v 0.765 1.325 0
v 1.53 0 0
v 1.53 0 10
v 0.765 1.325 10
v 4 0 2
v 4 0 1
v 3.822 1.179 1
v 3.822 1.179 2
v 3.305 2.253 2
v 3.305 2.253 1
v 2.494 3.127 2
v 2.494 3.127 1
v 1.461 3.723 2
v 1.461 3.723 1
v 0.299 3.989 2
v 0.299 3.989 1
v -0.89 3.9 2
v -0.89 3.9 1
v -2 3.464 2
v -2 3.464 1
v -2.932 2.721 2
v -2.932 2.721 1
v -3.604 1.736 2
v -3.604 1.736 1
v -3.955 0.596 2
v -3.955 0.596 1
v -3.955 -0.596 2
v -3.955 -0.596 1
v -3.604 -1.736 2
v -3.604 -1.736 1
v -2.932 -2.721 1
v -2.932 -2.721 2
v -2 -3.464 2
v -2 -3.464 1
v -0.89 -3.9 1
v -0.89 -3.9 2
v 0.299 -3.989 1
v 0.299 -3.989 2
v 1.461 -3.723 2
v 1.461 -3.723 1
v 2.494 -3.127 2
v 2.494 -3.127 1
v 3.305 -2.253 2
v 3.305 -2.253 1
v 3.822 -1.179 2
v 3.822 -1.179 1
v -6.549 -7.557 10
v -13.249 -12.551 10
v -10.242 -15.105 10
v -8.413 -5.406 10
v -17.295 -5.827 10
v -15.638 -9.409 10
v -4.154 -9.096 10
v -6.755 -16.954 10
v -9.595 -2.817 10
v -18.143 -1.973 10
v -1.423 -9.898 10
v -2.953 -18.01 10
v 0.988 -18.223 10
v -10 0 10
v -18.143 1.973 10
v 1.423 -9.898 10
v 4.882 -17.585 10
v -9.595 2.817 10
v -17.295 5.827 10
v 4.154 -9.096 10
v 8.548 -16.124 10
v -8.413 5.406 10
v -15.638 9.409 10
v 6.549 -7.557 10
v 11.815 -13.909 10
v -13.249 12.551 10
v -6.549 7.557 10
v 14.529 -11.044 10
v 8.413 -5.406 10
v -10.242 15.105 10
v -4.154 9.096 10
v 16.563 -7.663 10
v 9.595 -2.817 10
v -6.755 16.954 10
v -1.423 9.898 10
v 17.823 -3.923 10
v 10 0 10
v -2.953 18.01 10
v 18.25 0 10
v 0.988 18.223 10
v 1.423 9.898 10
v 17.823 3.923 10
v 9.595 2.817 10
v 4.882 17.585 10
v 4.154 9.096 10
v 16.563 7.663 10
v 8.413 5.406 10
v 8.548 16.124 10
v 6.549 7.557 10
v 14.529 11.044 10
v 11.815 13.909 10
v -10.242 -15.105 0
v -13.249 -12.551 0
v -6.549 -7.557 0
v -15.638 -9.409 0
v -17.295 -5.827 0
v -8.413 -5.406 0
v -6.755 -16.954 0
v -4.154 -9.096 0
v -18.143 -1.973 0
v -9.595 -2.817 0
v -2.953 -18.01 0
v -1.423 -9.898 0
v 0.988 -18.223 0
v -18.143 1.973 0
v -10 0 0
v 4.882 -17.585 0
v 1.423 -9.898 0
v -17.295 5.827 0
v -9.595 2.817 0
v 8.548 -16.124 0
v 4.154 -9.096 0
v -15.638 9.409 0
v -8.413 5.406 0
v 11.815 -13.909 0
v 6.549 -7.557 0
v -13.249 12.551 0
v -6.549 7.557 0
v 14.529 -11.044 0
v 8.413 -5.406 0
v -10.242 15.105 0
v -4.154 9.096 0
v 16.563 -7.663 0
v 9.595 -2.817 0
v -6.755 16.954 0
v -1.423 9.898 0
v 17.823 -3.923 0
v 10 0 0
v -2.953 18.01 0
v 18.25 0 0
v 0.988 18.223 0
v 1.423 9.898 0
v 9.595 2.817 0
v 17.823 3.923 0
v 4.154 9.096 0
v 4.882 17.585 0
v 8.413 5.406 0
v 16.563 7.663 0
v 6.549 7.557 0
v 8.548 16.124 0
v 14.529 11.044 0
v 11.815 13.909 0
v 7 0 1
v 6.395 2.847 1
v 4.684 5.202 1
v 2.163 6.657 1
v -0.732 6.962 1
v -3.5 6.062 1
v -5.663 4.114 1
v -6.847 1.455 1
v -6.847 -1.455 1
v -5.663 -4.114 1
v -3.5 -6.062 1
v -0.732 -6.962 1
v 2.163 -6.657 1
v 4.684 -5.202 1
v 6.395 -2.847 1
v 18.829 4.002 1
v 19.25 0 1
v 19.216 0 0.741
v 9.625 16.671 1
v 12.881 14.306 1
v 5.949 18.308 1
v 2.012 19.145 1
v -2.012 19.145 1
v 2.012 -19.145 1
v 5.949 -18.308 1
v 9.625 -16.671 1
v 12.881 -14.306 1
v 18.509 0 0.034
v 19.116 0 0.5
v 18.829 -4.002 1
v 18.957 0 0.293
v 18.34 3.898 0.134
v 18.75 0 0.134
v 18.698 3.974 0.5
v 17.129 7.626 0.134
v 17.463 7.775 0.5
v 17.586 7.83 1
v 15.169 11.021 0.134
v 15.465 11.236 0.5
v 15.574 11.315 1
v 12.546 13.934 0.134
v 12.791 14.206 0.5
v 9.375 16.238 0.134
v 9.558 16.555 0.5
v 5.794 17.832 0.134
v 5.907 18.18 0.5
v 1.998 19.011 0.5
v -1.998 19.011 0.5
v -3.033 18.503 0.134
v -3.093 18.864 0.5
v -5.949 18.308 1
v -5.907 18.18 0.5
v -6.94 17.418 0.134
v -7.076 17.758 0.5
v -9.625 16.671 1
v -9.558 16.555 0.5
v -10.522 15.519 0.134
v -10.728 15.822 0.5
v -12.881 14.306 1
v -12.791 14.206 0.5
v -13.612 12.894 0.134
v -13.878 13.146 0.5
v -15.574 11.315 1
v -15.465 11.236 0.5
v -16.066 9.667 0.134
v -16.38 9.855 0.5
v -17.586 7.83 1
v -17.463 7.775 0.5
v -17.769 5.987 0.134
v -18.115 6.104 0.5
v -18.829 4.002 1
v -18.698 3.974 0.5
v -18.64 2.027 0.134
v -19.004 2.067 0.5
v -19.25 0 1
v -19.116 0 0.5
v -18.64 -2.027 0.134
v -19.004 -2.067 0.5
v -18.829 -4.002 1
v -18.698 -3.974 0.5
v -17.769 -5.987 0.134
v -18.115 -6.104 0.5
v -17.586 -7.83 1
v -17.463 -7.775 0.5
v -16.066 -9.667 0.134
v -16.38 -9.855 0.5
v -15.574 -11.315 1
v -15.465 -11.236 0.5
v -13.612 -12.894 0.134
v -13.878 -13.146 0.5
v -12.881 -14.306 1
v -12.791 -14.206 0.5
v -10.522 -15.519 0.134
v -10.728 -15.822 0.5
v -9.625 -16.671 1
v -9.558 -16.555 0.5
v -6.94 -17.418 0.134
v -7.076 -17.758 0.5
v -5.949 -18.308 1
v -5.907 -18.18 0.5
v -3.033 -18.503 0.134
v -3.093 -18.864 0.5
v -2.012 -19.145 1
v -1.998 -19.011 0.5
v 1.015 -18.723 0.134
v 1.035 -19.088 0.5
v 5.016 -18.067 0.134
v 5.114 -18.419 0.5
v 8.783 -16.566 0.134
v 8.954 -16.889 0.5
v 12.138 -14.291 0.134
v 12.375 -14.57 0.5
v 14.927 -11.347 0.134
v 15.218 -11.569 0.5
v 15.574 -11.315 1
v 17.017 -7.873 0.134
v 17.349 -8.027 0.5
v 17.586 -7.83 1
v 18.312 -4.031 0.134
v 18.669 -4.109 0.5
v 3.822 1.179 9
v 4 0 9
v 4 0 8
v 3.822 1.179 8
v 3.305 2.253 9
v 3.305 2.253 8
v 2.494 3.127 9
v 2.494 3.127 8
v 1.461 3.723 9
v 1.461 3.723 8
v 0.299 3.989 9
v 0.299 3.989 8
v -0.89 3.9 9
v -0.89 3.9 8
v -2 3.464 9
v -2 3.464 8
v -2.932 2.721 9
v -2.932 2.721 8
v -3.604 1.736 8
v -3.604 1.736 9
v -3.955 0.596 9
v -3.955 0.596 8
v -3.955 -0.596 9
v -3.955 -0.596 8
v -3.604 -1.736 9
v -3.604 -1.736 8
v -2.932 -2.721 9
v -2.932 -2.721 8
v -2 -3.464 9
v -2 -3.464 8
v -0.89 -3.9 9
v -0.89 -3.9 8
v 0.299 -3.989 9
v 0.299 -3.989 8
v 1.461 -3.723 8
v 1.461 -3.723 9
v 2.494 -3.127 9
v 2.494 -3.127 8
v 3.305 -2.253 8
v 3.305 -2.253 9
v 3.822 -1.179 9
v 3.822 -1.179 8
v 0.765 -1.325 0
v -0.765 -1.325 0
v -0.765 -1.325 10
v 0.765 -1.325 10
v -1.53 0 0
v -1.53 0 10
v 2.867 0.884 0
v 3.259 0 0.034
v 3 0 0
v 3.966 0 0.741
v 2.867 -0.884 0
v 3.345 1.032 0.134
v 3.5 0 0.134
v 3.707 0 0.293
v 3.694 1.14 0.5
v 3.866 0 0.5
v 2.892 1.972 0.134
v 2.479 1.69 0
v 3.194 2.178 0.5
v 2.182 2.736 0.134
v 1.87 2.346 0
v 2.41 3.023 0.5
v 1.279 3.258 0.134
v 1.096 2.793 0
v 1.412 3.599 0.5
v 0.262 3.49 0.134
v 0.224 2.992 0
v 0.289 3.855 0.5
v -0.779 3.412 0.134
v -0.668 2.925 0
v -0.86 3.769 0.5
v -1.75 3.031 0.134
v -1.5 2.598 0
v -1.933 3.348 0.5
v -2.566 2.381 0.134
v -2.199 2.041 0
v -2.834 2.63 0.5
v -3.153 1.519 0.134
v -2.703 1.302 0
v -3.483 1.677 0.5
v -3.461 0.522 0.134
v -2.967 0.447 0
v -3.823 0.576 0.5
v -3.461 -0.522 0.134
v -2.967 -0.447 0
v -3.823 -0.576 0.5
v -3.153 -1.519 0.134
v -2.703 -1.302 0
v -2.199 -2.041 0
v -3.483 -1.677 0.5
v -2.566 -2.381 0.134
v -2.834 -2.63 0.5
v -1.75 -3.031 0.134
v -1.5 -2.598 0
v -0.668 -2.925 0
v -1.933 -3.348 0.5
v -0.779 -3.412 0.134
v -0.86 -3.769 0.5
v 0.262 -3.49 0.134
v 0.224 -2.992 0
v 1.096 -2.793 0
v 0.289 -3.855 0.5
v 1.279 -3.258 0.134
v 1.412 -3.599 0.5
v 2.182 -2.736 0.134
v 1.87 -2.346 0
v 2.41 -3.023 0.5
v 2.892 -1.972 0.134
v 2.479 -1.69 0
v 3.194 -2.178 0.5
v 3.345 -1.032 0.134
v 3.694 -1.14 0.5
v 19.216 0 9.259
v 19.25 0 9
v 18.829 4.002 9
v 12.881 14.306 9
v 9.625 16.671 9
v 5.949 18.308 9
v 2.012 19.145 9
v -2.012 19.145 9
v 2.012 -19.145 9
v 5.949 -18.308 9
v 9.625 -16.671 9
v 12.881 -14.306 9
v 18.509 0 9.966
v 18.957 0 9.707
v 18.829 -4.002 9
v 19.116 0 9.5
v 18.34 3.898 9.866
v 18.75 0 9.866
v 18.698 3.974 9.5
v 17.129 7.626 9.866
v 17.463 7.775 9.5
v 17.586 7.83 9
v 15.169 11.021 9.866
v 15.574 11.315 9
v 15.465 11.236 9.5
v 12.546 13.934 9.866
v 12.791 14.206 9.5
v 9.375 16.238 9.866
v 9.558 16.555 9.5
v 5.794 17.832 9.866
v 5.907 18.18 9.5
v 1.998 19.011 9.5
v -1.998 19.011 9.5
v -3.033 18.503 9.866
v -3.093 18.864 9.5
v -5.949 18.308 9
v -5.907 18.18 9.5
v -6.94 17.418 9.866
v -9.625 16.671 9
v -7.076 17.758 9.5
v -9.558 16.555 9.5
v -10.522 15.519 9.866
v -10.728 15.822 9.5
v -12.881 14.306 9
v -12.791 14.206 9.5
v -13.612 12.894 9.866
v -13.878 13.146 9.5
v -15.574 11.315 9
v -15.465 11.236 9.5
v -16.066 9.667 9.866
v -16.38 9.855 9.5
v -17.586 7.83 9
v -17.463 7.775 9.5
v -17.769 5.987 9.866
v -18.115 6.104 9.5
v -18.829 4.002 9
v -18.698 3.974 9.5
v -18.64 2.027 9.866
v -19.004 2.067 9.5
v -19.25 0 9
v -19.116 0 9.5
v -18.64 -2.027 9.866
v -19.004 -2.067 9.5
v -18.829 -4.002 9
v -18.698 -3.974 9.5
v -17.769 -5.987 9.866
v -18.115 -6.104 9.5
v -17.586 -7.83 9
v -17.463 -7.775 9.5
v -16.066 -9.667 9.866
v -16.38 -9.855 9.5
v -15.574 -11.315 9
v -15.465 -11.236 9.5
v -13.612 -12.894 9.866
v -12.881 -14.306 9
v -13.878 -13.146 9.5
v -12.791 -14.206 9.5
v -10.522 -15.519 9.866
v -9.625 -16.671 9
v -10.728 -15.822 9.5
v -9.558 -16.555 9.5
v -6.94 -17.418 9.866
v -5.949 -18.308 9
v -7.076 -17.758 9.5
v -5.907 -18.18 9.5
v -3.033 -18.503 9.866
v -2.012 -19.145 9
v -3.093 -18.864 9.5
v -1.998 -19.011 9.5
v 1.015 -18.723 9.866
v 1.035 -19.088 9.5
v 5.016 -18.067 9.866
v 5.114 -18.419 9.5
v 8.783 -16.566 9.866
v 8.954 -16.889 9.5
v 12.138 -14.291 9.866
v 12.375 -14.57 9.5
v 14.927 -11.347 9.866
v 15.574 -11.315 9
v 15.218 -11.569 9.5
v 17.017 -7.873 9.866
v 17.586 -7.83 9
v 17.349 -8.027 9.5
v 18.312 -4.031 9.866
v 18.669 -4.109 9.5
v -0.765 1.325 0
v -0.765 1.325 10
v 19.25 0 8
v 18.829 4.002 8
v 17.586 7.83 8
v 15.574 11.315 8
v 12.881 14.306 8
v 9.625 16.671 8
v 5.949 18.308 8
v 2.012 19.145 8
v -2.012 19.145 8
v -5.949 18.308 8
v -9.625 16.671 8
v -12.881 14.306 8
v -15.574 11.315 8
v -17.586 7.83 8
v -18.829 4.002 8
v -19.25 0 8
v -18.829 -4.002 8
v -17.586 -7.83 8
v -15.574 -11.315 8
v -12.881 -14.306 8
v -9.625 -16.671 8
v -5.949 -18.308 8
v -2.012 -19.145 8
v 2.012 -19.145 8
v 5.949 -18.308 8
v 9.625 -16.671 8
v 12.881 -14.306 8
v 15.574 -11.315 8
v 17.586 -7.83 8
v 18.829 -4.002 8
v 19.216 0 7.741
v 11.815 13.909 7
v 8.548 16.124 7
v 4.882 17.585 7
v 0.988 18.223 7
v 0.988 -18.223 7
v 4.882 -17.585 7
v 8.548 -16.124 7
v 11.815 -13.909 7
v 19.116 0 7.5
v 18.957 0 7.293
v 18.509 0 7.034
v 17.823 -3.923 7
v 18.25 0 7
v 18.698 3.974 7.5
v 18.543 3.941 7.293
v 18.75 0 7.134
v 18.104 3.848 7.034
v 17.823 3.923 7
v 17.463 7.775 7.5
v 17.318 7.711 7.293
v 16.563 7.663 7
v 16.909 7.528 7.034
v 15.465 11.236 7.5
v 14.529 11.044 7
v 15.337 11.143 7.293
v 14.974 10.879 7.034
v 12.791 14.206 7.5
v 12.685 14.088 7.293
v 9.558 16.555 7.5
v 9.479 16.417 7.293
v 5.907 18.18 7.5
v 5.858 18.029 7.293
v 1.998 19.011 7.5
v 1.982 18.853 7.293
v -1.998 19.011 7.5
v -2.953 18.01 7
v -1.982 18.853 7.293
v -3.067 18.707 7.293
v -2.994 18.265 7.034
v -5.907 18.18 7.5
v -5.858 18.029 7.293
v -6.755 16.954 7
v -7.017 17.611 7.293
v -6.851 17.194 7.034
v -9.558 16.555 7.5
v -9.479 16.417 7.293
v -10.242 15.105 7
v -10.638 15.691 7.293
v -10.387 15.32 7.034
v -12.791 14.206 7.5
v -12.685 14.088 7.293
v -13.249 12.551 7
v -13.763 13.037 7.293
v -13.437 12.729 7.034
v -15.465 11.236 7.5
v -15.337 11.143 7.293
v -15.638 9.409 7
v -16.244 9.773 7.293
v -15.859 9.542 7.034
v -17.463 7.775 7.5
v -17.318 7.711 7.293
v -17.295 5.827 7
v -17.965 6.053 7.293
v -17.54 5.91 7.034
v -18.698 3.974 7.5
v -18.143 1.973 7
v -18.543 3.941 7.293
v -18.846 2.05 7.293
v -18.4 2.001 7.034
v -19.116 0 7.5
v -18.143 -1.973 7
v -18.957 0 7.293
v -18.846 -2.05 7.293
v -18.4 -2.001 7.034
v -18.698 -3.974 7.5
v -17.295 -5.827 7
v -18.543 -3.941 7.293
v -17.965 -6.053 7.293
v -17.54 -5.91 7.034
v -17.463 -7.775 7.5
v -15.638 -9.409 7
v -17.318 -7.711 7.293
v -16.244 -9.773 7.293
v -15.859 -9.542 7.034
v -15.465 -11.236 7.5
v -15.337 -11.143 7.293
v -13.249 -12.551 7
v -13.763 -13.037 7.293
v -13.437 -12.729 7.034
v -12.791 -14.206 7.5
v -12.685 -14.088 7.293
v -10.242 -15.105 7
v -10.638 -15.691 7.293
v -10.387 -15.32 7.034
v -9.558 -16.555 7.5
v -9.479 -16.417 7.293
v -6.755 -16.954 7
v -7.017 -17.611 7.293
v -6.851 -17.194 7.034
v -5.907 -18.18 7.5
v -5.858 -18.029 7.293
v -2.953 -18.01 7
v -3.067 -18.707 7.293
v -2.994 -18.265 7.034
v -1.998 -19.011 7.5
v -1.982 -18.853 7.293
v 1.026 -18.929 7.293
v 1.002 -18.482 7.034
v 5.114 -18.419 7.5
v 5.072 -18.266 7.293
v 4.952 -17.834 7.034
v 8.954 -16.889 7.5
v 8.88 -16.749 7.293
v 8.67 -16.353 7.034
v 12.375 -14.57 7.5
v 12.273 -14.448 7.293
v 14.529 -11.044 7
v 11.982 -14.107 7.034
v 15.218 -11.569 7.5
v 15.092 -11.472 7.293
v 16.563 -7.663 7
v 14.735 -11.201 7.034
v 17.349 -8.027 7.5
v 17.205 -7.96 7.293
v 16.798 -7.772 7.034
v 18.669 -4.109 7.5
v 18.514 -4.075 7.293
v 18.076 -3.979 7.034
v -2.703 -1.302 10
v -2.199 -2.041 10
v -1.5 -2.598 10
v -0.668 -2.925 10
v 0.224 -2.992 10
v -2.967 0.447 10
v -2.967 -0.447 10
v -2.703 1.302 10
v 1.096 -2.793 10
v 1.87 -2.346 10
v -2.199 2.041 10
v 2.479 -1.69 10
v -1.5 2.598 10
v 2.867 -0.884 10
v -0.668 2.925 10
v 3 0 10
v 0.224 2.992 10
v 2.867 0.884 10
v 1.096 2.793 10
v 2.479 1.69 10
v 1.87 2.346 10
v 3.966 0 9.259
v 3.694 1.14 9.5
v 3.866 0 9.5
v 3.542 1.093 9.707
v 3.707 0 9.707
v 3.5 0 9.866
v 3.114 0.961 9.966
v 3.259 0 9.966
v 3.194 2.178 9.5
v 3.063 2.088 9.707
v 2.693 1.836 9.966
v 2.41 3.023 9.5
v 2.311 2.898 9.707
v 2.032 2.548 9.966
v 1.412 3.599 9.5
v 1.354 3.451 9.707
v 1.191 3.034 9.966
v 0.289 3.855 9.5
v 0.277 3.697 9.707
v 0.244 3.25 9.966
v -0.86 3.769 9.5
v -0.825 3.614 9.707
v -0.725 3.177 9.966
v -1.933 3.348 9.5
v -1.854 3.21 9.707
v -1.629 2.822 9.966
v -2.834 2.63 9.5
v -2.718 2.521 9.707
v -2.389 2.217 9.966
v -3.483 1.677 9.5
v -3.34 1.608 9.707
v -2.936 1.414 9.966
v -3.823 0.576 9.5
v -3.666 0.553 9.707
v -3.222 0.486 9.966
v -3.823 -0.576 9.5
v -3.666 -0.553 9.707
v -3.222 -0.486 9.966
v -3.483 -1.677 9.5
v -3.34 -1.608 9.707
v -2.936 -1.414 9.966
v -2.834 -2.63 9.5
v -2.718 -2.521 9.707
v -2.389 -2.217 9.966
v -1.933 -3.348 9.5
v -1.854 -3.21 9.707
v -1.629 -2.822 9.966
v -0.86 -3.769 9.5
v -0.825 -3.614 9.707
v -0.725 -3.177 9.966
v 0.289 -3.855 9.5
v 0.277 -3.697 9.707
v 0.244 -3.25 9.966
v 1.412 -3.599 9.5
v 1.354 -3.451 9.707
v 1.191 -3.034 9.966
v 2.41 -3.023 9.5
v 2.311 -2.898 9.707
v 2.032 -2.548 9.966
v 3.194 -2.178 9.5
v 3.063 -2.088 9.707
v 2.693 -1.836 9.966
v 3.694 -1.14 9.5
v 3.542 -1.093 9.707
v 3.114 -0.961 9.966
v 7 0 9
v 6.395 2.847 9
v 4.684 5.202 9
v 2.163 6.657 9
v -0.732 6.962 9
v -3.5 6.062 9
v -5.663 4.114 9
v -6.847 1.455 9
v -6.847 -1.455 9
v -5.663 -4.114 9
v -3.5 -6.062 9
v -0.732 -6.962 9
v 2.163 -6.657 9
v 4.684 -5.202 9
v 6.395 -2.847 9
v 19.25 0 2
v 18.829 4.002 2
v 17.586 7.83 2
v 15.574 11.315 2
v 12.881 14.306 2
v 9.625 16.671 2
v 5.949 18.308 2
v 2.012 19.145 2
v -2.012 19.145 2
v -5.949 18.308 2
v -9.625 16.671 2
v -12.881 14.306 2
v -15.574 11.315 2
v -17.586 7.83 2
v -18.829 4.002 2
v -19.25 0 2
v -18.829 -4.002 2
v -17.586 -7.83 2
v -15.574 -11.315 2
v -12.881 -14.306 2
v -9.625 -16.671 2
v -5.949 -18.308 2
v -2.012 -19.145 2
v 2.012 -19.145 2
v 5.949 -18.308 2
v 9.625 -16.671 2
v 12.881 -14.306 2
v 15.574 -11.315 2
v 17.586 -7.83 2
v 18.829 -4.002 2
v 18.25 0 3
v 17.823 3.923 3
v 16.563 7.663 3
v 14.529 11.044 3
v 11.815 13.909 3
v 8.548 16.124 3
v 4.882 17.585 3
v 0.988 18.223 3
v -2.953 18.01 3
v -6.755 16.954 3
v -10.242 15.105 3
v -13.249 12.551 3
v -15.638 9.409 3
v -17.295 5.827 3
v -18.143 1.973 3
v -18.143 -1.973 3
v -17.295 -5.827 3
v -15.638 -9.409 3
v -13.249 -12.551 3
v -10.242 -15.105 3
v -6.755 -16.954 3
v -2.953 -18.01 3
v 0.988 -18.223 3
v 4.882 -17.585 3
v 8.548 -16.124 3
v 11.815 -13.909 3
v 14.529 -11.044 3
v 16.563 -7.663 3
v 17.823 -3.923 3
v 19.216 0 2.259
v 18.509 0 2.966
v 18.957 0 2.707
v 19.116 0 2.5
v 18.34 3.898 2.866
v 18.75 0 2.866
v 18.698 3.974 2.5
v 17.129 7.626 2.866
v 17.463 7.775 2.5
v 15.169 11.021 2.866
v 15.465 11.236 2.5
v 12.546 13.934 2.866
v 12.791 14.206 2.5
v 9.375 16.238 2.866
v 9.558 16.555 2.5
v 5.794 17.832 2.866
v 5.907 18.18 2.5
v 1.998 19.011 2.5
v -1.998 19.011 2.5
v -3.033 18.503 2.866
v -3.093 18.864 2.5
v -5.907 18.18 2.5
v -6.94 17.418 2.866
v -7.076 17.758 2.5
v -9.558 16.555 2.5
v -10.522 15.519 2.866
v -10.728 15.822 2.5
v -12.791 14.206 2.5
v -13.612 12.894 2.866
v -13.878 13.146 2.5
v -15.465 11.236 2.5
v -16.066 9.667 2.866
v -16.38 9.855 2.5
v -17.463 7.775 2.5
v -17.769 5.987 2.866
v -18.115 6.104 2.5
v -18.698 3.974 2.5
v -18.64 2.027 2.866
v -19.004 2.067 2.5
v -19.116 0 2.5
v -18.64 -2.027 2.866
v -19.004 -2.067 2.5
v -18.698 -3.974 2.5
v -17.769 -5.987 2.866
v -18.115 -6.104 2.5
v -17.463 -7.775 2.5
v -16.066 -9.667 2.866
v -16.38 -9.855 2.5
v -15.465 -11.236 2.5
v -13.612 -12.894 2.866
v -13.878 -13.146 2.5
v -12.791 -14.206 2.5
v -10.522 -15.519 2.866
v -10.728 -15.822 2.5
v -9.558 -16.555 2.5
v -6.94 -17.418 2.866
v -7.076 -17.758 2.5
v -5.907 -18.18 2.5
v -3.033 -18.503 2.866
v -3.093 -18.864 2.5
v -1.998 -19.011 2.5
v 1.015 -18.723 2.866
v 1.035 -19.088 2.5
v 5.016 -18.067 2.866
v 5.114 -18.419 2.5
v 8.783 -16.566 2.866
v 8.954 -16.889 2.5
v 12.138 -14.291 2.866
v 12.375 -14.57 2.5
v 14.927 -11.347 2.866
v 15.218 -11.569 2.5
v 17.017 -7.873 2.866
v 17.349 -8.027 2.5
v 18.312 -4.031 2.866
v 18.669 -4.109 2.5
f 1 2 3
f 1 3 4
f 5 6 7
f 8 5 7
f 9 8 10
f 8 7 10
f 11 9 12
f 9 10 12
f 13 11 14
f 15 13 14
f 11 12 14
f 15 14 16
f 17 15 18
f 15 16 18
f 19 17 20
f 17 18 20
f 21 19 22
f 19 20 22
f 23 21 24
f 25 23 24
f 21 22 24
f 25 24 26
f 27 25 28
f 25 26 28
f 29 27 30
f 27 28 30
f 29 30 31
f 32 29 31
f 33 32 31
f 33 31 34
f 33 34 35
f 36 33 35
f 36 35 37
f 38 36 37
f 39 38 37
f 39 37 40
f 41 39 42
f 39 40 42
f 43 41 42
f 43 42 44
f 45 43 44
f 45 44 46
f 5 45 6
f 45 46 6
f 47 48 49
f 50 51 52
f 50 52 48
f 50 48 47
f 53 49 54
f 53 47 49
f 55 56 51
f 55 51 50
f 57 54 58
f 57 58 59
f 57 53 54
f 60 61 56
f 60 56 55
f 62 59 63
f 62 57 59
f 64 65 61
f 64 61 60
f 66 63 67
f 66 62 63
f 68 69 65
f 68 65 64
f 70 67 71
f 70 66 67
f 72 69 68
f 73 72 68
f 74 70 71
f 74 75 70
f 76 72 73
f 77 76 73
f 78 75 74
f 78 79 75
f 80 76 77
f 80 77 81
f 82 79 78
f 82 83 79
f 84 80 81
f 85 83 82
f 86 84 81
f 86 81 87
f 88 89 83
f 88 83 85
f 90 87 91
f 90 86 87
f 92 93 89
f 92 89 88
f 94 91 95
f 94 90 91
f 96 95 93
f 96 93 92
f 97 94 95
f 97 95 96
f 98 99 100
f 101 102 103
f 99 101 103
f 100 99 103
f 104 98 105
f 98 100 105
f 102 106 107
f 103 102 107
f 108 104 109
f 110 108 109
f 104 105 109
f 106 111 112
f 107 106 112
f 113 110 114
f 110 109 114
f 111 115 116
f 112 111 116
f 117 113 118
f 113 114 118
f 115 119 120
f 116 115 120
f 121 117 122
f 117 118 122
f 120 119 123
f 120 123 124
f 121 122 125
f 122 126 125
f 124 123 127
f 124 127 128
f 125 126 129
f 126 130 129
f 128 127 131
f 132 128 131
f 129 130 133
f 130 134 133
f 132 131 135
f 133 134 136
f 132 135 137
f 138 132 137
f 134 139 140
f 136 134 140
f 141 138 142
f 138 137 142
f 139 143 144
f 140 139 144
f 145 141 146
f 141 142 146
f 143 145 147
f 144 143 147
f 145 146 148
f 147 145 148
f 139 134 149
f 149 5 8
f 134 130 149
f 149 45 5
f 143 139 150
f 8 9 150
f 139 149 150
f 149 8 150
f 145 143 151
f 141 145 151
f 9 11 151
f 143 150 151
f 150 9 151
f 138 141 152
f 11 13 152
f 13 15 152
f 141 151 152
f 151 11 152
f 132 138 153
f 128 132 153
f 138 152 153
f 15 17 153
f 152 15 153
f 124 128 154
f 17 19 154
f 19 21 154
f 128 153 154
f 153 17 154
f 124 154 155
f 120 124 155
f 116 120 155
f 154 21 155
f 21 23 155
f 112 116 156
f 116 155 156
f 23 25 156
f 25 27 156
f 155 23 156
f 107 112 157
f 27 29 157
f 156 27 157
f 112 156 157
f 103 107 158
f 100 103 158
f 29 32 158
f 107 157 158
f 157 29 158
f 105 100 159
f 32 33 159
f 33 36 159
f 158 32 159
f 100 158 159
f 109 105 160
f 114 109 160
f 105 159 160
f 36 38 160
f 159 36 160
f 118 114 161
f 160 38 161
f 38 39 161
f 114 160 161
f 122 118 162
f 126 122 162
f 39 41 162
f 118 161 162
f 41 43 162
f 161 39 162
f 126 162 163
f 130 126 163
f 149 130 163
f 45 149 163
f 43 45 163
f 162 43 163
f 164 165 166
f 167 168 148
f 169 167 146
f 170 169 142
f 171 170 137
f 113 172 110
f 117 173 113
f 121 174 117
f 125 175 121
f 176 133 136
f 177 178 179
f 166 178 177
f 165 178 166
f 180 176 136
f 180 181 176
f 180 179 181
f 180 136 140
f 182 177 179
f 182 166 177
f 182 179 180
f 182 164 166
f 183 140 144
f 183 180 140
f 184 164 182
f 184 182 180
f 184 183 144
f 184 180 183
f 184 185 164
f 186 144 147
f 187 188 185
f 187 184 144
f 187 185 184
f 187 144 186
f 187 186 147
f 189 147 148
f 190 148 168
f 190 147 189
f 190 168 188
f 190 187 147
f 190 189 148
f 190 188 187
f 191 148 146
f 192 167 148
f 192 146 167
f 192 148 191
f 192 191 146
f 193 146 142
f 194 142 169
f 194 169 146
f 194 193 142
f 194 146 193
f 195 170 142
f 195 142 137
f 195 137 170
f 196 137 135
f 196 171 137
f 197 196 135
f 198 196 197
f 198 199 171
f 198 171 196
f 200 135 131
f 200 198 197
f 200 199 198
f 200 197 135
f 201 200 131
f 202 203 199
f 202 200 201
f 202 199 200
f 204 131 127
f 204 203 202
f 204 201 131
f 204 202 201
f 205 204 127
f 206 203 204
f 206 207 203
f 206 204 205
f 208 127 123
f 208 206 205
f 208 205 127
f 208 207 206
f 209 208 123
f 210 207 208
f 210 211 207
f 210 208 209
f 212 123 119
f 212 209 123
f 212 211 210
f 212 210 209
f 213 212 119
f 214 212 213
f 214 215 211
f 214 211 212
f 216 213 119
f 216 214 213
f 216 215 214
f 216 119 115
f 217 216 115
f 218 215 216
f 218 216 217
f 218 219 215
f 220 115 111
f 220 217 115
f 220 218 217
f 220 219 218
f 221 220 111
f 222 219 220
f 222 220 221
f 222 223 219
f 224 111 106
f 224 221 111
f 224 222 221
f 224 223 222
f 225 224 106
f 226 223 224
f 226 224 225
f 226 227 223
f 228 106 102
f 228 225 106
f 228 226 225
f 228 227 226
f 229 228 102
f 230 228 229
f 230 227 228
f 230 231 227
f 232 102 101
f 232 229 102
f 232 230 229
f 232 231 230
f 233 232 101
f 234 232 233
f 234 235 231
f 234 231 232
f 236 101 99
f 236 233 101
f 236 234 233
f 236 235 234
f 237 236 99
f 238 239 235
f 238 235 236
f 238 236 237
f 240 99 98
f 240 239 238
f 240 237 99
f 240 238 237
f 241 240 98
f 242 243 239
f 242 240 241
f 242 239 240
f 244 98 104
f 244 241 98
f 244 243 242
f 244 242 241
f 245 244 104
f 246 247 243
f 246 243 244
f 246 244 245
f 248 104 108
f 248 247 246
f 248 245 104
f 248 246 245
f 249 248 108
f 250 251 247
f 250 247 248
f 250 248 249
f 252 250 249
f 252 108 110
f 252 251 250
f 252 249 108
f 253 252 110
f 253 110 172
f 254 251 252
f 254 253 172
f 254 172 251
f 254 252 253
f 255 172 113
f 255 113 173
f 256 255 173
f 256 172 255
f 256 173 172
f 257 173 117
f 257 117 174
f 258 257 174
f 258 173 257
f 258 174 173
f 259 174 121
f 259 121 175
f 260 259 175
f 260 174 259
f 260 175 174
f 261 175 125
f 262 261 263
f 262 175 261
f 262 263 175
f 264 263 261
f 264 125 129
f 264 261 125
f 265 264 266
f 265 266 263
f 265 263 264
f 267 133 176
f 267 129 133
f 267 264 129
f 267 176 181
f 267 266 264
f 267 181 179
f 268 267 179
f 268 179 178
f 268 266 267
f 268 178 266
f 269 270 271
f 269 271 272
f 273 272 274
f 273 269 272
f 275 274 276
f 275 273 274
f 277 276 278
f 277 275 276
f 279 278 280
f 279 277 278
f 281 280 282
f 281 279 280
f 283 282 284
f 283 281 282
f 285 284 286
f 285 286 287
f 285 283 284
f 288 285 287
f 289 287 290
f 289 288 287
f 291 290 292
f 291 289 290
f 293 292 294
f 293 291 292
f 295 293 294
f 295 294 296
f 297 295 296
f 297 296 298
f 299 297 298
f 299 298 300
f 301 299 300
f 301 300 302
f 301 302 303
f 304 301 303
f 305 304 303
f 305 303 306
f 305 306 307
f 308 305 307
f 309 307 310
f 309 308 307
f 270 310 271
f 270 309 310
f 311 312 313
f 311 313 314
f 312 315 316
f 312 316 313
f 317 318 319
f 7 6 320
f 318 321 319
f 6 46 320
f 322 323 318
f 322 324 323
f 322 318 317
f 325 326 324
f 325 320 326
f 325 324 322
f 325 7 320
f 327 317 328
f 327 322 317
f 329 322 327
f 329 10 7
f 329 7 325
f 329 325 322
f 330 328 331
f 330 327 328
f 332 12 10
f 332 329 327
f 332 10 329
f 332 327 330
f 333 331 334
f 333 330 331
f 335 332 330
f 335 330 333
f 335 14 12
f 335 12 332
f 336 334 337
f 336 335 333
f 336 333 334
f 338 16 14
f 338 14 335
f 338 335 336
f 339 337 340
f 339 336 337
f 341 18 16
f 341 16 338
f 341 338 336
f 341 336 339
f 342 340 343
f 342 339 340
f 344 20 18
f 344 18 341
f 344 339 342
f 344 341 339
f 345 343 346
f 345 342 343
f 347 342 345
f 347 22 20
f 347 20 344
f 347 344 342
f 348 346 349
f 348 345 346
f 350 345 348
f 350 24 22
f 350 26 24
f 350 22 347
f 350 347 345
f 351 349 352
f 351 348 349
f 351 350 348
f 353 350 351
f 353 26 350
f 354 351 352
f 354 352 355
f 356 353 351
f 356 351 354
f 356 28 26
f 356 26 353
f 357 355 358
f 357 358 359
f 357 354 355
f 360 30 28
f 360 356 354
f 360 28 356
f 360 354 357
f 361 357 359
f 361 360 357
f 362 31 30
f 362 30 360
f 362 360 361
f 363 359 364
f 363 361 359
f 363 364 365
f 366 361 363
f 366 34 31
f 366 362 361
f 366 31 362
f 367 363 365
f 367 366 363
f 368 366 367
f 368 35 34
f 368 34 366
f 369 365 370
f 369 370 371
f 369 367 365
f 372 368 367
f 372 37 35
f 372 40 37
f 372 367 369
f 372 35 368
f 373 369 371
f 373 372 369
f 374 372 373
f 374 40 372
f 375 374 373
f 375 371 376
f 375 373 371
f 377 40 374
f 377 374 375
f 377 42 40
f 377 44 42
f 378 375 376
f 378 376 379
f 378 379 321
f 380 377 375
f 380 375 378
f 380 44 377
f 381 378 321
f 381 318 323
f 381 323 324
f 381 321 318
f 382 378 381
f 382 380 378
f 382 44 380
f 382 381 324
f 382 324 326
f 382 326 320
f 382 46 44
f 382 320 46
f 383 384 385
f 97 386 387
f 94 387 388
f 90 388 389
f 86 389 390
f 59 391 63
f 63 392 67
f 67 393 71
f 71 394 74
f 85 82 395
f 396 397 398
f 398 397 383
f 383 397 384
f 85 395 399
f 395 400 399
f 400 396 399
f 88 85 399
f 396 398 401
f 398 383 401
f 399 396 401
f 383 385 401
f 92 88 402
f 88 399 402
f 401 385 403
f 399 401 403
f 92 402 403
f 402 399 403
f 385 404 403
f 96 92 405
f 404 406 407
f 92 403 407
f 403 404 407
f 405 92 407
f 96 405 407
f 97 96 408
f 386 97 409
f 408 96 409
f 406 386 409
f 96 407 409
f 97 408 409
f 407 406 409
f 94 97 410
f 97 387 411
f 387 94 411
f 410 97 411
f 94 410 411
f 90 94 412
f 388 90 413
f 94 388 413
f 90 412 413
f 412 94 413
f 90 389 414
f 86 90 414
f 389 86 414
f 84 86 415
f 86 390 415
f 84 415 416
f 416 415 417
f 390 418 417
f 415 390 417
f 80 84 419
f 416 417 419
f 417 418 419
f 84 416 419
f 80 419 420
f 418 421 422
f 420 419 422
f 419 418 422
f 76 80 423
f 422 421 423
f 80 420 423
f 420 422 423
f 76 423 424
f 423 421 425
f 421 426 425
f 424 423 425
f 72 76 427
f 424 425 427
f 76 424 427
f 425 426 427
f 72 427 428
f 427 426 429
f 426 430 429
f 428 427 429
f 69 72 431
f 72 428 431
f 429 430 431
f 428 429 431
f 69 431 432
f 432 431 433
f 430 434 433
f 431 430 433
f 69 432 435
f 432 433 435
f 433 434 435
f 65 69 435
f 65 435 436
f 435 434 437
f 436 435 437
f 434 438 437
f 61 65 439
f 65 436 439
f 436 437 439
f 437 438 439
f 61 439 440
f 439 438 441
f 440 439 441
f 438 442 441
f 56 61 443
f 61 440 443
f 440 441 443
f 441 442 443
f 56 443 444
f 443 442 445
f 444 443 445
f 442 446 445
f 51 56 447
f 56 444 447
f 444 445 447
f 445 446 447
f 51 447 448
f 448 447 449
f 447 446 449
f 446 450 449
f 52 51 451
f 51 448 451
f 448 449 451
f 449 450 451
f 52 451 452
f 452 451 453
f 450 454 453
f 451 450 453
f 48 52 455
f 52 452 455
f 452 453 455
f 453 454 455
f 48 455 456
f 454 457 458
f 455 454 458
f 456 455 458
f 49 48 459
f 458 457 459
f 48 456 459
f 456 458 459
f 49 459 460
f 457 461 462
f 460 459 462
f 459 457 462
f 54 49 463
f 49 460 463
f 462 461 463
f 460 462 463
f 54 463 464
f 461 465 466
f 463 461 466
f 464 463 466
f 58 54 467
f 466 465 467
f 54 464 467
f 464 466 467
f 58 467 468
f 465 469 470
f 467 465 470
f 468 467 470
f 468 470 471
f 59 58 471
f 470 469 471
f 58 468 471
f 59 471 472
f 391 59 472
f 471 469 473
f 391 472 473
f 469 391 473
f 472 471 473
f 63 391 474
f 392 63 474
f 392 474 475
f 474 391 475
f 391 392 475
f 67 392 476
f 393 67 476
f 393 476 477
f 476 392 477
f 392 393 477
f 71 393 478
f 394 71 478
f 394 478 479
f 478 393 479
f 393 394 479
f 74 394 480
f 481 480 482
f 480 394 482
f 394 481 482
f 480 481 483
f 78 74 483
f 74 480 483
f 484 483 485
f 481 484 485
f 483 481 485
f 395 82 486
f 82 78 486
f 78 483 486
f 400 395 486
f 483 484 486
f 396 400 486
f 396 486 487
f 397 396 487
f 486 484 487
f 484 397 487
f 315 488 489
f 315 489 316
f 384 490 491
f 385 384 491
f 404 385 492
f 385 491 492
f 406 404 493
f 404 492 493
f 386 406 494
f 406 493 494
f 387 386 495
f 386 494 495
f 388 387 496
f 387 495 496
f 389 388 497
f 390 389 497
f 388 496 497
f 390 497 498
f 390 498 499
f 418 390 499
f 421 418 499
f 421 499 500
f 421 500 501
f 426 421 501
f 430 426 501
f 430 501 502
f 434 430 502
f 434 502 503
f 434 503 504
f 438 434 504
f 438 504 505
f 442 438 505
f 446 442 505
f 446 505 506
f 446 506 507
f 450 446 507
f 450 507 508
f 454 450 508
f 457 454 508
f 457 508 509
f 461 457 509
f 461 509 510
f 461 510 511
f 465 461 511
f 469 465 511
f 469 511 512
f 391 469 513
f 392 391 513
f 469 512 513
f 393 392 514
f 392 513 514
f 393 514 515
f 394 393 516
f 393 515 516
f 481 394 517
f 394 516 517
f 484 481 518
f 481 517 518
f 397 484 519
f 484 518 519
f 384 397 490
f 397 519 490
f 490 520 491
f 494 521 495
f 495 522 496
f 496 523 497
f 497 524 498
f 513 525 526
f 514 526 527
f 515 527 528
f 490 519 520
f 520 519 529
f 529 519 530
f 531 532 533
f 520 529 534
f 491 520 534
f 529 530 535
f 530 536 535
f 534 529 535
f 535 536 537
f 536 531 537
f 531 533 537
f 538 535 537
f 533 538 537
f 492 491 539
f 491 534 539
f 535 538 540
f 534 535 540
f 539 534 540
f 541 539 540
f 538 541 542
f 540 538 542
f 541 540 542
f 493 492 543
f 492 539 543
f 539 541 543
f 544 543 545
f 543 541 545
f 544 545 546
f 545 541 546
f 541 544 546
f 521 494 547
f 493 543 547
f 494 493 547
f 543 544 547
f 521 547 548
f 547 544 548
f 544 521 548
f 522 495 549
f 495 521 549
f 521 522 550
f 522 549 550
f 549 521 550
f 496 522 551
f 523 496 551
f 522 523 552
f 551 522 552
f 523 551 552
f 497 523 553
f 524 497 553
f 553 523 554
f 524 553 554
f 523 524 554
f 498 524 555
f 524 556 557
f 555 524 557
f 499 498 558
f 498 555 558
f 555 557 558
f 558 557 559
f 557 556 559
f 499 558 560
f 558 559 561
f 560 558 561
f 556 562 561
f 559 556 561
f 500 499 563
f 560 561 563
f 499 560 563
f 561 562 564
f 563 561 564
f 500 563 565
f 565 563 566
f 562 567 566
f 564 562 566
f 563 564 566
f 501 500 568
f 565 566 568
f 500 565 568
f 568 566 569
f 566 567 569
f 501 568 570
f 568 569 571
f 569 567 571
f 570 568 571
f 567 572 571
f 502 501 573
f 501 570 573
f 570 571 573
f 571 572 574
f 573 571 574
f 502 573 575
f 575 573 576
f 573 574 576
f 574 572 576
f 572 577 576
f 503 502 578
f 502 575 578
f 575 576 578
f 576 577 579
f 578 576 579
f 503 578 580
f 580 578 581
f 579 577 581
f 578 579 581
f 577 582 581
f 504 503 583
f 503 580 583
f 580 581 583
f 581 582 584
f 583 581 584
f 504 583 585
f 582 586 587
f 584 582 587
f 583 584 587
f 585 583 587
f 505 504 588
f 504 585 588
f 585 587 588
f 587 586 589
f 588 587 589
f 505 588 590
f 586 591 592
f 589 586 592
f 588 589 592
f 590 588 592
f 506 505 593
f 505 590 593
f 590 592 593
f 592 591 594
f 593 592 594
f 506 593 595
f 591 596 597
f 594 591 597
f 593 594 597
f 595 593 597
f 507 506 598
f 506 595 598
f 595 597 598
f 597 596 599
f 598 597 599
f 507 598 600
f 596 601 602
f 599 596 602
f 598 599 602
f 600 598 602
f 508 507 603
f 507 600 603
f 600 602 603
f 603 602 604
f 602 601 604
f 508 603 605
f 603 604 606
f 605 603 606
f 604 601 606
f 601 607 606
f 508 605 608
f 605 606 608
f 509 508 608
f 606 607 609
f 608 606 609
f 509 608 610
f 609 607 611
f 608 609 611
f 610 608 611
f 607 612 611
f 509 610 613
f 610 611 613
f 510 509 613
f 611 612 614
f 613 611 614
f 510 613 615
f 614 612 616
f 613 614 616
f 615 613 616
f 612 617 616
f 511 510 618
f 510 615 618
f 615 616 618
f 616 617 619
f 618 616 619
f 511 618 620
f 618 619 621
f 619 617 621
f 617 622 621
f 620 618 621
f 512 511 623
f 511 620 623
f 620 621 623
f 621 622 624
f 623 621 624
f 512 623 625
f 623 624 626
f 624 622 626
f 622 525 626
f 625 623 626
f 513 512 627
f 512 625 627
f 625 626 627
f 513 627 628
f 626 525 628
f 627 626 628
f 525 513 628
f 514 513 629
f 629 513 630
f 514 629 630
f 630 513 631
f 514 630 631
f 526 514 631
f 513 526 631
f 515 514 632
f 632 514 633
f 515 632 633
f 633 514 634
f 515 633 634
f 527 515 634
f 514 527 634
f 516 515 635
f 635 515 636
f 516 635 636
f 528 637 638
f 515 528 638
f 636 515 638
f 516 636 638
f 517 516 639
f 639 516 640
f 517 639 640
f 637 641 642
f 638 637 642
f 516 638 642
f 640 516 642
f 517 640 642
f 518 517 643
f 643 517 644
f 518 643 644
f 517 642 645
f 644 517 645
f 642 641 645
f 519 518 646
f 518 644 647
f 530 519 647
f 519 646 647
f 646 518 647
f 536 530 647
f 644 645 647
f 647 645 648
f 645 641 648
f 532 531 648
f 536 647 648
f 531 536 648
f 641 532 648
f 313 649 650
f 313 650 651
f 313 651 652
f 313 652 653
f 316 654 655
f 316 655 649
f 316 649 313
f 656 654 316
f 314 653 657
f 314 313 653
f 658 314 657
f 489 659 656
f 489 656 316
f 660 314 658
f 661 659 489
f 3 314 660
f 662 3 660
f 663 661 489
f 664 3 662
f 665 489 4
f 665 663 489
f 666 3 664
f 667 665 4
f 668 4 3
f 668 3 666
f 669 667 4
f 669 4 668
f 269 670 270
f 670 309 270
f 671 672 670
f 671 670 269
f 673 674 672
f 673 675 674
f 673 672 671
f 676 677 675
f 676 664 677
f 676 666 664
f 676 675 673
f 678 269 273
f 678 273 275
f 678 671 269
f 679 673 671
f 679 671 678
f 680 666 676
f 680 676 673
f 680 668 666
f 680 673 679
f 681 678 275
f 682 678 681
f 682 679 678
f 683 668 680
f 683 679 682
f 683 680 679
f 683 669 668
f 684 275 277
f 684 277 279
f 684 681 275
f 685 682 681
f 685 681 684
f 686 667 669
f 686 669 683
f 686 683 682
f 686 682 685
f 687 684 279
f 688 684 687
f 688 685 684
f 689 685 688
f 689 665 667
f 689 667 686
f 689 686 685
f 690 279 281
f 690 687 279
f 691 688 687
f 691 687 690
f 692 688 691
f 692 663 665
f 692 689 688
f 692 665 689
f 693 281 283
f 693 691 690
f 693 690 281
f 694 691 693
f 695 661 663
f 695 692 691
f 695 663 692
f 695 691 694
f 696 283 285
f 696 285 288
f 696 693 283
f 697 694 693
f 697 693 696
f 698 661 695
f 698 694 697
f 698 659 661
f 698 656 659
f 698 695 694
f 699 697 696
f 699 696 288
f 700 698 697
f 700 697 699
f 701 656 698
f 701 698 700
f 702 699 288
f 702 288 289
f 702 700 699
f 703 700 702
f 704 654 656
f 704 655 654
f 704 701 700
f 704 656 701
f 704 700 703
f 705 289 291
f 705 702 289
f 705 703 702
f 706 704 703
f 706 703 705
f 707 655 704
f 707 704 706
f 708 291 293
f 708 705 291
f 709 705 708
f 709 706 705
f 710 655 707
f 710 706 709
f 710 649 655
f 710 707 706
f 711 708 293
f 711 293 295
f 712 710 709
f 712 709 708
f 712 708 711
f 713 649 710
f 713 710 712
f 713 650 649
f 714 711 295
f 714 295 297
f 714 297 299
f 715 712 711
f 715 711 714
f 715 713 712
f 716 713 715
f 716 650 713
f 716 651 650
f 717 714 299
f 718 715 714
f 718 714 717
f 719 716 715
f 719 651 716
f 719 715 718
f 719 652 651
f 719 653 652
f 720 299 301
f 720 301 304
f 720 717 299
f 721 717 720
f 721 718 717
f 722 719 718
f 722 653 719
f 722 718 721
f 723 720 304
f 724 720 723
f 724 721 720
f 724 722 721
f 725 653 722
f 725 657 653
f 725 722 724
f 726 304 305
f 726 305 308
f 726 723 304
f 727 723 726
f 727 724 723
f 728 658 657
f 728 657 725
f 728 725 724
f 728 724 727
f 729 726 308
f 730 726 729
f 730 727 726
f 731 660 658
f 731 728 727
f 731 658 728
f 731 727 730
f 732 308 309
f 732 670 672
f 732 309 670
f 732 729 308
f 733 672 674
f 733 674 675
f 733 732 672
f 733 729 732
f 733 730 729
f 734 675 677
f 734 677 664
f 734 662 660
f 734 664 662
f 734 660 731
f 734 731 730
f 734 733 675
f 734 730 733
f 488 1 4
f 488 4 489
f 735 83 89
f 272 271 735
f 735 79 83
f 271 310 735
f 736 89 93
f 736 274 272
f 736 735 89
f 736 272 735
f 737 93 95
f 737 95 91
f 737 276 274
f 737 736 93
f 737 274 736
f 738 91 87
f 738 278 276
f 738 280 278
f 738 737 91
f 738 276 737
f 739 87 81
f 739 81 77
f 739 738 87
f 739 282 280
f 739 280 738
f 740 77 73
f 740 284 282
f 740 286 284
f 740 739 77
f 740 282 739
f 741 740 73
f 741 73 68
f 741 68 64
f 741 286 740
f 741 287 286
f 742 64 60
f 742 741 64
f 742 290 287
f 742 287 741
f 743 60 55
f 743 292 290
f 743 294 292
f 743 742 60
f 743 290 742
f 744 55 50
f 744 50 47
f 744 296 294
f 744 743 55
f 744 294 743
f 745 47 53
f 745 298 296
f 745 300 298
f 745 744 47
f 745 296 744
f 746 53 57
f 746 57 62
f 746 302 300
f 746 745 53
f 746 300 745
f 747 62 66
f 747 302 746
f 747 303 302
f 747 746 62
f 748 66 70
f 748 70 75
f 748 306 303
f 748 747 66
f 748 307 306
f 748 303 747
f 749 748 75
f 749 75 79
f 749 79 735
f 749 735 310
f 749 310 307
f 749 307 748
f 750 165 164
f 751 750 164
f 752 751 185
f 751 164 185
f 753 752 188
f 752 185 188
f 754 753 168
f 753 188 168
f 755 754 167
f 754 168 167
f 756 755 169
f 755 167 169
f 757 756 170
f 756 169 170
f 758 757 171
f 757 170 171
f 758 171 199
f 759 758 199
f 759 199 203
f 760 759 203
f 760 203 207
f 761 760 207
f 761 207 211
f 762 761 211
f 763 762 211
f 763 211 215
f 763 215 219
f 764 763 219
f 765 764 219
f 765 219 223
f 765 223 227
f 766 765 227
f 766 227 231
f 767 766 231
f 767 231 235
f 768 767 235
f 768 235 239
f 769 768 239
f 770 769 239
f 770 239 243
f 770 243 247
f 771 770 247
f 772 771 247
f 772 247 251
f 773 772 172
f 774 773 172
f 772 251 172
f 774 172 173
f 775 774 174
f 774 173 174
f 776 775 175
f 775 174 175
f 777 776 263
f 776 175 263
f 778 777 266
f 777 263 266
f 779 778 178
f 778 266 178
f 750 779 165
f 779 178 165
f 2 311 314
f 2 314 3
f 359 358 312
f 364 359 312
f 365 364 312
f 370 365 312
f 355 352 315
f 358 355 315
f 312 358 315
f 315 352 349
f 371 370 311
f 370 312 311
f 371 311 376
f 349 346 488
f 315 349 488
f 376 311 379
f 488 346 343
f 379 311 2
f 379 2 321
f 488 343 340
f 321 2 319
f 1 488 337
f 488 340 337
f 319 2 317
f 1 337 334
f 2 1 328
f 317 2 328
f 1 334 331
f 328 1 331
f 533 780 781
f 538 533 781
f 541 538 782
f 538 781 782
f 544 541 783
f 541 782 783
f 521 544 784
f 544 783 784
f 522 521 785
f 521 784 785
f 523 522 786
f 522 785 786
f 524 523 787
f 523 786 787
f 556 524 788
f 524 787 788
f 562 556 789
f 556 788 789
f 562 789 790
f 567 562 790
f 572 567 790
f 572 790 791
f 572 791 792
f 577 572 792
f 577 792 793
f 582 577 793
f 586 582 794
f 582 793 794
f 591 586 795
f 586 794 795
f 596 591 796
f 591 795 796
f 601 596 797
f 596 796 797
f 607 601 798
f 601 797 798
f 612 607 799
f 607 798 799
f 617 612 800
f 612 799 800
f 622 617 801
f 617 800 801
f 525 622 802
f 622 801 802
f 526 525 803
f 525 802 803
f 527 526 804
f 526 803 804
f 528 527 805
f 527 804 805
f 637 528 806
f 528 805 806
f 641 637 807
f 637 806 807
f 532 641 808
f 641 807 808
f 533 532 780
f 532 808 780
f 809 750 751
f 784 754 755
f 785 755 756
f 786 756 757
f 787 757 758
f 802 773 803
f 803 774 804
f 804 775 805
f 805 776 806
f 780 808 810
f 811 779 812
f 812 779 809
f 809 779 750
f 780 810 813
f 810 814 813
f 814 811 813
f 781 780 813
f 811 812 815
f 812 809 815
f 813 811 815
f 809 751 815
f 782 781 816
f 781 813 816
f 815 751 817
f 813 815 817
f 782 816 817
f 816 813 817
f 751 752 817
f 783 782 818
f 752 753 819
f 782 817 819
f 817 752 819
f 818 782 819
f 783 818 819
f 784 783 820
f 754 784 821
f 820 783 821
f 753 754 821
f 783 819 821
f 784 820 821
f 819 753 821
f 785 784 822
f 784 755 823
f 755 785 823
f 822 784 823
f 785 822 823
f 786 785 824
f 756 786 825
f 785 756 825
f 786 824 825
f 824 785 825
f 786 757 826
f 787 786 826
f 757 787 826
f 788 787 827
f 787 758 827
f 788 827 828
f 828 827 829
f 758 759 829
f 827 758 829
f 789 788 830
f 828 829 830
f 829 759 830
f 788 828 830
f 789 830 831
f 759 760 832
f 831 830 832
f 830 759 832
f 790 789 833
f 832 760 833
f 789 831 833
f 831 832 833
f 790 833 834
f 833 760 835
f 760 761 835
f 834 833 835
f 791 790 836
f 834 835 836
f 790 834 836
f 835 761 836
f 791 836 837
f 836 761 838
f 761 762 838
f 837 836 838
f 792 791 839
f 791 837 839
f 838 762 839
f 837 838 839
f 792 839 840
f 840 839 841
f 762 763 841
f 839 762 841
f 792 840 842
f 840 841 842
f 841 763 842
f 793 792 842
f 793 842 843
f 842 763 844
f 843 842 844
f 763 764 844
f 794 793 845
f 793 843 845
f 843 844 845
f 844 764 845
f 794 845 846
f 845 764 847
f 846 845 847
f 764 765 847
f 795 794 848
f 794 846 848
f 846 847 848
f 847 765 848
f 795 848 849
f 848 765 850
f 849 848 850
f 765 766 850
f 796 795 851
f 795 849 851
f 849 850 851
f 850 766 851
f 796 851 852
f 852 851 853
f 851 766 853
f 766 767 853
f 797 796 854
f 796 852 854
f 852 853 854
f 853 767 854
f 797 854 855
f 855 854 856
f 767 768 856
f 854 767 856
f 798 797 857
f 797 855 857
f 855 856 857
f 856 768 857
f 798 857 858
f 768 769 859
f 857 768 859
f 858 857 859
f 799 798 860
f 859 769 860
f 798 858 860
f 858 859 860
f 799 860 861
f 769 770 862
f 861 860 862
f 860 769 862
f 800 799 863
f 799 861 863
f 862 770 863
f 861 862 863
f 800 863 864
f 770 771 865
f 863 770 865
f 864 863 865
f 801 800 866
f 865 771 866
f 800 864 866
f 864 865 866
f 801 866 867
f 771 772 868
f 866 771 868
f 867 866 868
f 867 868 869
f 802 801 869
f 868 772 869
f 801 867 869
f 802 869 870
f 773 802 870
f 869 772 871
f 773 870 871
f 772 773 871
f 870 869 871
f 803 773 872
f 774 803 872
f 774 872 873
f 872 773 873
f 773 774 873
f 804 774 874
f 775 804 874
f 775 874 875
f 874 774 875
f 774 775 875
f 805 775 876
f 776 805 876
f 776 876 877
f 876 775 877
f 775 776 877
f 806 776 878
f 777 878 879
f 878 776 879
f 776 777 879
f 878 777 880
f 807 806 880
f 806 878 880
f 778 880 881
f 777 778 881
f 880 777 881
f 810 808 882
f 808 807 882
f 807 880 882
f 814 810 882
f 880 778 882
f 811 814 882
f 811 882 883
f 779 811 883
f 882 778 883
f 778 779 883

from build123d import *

# Parameters (mm, degrees)
F0_R      = 19.25
F0_R_2    = 1
F1_DEPTH  = 10
F4_R      = 10
F3_R      = 4
F8_R      = 10
F7_R      = 4
F11_R     = 4
F11_R_2   = 1
F12_DEPTH = 2
F14_R     = 19.25
F14_R_2   = 18.25
F15_DEPTH = 4
F16_R     = 0.99999
F18_DEPTH = 25


# Not quite as in the source:
# - a fillet or chamfer is up to 0.001 mm smaller than in the source, because OpenCascade refuses the exact size
# - a feature of the source that left no trace in its solid (it failed there, or was rolled back) is left out
# - a pattern or mirror of a feature is missing from the dataset's text; its kind, count and spacing are read off the source's solid


with BuildPart() as f1:
    # F0 (on Top) → F1 (new body)
    with BuildSketch(Plane.XY):
        Circle(F0_R)
        Circle(F0_R_2, mode=Mode.SUBTRACT)
    extrude(amount=F1_DEPTH)

    # F4 (on face) → F5 section 0
    with BuildSketch(Plane.XY.offset(10)):
        Circle(F4_R)
    # F3 (on offset) → F5 section 1
    with BuildSketch(Plane.XY.offset(8)):
        Circle(F3_R)
    loft(mode=Mode.SUBTRACT)

    # F8 (on face) → F9 section 0
    with BuildSketch(Plane.XY):
        Circle(F8_R)
    # F7 (on offset) → F9 section 1
    with BuildSketch(Plane.XY.offset(2)):
        Circle(F7_R)
    loft(mode=Mode.SUBTRACT)

    # F11 (on face) → F12 (join, through all)
    with BuildSketch(Plane.XY):
        Circle(F11_R)
        Circle(F11_R_2, mode=Mode.SUBTRACT)
    f12 = extrude(amount=F12_DEPTH)

    # F12_copies: F12 across plane
    add(f12.mirror(Plane.XY.offset(5)))

    # F14 (on offset) → F15 (cut)
    with BuildSketch(Plane.XY.offset(3)):
        Circle(F14_R)
        Circle(F14_R_2, mode=Mode.SUBTRACT)
    extrude(amount=F15_DEPTH, mode=Mode.SUBTRACT)

    # F16 (radius 1 in the source; OpenCascade refuses exactly that, so slightly less here)
    f16_edges = [f1.edges().sort_by_distance(p)[0] for p in [
        (-4, 0, 0),
        (-19.25, 0, 10),
        (-19.25, 0, 0),
        (-19.25, 0, 7),
        (-19.25, 0, 3),
        (-4, 0, 10),
    ]]
    fillet(f16_edges, radius=F16_R)

    # F17 (on Top) → F18 (cut)
    with BuildSketch(Plane.XY):
        Polygon((0.7649891067, 1.325), (-0.7649891067, 1.325), (-1.5299782134, 0), (-0.7649891067, -1.325), (0.7649891067, -1.325), (1.5299782134, 0), align=None)
    extrude(amount=F18_DEPTH, mode=Mode.SUBTRACT)


solid = f1.part
